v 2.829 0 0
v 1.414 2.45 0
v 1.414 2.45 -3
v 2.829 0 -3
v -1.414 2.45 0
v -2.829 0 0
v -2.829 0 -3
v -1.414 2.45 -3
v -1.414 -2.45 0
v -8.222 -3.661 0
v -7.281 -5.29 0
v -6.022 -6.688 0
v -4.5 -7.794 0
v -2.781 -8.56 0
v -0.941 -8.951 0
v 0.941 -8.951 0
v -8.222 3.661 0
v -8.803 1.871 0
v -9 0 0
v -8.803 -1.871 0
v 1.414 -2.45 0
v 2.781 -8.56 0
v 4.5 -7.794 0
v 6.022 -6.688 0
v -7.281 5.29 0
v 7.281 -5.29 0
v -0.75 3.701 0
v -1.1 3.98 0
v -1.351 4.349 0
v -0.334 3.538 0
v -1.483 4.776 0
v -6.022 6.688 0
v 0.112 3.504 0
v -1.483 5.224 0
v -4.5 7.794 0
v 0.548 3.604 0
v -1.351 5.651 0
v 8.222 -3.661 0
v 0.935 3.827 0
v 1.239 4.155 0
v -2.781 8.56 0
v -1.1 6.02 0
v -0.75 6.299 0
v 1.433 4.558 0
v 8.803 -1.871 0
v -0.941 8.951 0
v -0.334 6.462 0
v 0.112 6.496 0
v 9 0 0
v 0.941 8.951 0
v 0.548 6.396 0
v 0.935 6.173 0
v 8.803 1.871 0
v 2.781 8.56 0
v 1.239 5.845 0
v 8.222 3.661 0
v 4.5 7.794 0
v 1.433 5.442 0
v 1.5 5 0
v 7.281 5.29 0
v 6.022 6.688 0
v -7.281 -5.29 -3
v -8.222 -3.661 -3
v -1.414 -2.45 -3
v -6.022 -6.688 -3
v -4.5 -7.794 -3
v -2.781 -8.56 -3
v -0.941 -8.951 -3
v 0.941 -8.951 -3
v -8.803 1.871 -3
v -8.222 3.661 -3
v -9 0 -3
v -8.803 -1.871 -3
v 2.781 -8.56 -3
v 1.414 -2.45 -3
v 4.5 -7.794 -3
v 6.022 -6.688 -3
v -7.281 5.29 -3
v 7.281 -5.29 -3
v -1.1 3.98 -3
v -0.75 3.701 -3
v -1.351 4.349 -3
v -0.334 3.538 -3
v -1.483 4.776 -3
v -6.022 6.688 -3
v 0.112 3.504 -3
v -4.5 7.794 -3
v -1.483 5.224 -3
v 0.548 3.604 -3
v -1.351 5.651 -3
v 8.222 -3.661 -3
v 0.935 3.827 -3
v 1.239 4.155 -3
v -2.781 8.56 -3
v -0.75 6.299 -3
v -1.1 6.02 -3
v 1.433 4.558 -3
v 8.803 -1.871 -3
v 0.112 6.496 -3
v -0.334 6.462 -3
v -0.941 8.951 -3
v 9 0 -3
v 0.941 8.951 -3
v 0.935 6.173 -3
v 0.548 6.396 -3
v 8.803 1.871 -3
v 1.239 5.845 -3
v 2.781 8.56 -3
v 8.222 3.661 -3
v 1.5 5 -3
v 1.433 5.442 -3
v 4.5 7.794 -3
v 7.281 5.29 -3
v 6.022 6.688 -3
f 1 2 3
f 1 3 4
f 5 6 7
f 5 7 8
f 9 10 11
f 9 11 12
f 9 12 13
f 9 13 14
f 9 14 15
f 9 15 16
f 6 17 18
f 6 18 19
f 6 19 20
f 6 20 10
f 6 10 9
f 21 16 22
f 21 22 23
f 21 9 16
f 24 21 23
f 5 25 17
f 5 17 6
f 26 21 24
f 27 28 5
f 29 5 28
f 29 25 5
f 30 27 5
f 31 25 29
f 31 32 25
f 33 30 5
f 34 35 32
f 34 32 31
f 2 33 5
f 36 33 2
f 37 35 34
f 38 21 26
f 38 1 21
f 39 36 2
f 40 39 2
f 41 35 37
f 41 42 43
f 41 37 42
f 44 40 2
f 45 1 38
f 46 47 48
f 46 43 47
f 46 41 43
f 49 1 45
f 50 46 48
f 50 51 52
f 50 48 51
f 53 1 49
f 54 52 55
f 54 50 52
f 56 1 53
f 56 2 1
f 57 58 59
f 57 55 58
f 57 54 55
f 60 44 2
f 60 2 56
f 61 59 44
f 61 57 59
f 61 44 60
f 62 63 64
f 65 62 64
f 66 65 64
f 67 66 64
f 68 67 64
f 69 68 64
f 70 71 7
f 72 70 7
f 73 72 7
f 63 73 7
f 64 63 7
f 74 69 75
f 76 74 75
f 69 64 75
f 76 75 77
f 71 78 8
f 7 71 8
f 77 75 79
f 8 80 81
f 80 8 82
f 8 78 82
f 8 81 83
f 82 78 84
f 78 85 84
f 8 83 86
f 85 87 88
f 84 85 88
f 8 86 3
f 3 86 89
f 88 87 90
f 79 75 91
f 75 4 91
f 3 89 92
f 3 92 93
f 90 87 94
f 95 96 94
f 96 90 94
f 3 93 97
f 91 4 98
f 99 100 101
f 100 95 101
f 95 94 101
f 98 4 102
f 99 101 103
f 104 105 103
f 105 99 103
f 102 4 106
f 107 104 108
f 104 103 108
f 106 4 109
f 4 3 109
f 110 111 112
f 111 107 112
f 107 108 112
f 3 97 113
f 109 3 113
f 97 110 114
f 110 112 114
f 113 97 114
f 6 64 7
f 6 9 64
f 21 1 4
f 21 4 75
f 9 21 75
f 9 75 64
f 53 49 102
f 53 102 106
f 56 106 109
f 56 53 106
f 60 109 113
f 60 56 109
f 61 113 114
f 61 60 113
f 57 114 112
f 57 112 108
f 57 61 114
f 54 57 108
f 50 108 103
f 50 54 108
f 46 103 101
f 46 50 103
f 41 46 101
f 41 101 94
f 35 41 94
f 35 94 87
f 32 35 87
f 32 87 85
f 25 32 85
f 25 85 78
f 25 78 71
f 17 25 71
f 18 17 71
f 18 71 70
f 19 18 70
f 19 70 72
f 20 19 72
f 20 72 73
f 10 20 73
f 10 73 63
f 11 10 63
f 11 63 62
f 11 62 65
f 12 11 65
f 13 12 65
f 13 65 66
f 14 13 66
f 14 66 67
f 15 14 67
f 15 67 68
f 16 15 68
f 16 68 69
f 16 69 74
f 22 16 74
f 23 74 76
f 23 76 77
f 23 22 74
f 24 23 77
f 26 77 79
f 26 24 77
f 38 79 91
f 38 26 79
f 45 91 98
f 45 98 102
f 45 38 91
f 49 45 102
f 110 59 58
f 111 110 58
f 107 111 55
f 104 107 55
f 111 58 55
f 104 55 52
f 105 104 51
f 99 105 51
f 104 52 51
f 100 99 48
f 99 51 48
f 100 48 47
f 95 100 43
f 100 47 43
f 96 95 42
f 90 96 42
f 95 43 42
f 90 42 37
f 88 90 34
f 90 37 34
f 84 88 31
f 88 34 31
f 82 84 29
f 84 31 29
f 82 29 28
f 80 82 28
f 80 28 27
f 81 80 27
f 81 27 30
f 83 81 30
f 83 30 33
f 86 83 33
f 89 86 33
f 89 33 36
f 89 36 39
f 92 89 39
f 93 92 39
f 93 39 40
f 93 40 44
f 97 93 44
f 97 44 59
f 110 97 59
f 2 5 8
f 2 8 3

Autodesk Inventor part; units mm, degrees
ref_plane "YZ Plane" through (0, 0, 0) normal (1, 0, 0) x (0, 1, 0)
ref_plane "XZ Plane" through (0, 0, 0) normal (0, 1, 0) x (-1, 0, 0)
ref_plane "XY Plane" through (0, 0, 0) normal (0, 0, 1) x (1, 0, 0)
sketch "Sketch1" plane through (0, 0, 0) normal (0, 0, 1) x (1, 0, 0)
  circle A0 centre (0, 0) radius 9
  circle A1 centre (0, 5) radius 1.5
  line L0 (1.4145, 2.45) -> (2.829, 0)
  line L1 (2.829, 0) -> (1.4145, -2.45)
  line L2 (1.4145, -2.45) -> (-1.4145, -2.45)
  line L3 (-1.4145, -2.45) -> (-2.829, 0)
  line L4 (-2.829, 0) -> (-1.4145, 2.45)
  line L5 (-1.4145, 2.45) -> (1.4145, 2.45)
  dimension "d0" = 18
  dimension "d1" = 4.9
  dimension "d2" = 5
  dimension "d3" = 3
extrude "Extrusion1" add sketch "Sketch1" against normal blind 3
properties part number "OutputDisk2"
